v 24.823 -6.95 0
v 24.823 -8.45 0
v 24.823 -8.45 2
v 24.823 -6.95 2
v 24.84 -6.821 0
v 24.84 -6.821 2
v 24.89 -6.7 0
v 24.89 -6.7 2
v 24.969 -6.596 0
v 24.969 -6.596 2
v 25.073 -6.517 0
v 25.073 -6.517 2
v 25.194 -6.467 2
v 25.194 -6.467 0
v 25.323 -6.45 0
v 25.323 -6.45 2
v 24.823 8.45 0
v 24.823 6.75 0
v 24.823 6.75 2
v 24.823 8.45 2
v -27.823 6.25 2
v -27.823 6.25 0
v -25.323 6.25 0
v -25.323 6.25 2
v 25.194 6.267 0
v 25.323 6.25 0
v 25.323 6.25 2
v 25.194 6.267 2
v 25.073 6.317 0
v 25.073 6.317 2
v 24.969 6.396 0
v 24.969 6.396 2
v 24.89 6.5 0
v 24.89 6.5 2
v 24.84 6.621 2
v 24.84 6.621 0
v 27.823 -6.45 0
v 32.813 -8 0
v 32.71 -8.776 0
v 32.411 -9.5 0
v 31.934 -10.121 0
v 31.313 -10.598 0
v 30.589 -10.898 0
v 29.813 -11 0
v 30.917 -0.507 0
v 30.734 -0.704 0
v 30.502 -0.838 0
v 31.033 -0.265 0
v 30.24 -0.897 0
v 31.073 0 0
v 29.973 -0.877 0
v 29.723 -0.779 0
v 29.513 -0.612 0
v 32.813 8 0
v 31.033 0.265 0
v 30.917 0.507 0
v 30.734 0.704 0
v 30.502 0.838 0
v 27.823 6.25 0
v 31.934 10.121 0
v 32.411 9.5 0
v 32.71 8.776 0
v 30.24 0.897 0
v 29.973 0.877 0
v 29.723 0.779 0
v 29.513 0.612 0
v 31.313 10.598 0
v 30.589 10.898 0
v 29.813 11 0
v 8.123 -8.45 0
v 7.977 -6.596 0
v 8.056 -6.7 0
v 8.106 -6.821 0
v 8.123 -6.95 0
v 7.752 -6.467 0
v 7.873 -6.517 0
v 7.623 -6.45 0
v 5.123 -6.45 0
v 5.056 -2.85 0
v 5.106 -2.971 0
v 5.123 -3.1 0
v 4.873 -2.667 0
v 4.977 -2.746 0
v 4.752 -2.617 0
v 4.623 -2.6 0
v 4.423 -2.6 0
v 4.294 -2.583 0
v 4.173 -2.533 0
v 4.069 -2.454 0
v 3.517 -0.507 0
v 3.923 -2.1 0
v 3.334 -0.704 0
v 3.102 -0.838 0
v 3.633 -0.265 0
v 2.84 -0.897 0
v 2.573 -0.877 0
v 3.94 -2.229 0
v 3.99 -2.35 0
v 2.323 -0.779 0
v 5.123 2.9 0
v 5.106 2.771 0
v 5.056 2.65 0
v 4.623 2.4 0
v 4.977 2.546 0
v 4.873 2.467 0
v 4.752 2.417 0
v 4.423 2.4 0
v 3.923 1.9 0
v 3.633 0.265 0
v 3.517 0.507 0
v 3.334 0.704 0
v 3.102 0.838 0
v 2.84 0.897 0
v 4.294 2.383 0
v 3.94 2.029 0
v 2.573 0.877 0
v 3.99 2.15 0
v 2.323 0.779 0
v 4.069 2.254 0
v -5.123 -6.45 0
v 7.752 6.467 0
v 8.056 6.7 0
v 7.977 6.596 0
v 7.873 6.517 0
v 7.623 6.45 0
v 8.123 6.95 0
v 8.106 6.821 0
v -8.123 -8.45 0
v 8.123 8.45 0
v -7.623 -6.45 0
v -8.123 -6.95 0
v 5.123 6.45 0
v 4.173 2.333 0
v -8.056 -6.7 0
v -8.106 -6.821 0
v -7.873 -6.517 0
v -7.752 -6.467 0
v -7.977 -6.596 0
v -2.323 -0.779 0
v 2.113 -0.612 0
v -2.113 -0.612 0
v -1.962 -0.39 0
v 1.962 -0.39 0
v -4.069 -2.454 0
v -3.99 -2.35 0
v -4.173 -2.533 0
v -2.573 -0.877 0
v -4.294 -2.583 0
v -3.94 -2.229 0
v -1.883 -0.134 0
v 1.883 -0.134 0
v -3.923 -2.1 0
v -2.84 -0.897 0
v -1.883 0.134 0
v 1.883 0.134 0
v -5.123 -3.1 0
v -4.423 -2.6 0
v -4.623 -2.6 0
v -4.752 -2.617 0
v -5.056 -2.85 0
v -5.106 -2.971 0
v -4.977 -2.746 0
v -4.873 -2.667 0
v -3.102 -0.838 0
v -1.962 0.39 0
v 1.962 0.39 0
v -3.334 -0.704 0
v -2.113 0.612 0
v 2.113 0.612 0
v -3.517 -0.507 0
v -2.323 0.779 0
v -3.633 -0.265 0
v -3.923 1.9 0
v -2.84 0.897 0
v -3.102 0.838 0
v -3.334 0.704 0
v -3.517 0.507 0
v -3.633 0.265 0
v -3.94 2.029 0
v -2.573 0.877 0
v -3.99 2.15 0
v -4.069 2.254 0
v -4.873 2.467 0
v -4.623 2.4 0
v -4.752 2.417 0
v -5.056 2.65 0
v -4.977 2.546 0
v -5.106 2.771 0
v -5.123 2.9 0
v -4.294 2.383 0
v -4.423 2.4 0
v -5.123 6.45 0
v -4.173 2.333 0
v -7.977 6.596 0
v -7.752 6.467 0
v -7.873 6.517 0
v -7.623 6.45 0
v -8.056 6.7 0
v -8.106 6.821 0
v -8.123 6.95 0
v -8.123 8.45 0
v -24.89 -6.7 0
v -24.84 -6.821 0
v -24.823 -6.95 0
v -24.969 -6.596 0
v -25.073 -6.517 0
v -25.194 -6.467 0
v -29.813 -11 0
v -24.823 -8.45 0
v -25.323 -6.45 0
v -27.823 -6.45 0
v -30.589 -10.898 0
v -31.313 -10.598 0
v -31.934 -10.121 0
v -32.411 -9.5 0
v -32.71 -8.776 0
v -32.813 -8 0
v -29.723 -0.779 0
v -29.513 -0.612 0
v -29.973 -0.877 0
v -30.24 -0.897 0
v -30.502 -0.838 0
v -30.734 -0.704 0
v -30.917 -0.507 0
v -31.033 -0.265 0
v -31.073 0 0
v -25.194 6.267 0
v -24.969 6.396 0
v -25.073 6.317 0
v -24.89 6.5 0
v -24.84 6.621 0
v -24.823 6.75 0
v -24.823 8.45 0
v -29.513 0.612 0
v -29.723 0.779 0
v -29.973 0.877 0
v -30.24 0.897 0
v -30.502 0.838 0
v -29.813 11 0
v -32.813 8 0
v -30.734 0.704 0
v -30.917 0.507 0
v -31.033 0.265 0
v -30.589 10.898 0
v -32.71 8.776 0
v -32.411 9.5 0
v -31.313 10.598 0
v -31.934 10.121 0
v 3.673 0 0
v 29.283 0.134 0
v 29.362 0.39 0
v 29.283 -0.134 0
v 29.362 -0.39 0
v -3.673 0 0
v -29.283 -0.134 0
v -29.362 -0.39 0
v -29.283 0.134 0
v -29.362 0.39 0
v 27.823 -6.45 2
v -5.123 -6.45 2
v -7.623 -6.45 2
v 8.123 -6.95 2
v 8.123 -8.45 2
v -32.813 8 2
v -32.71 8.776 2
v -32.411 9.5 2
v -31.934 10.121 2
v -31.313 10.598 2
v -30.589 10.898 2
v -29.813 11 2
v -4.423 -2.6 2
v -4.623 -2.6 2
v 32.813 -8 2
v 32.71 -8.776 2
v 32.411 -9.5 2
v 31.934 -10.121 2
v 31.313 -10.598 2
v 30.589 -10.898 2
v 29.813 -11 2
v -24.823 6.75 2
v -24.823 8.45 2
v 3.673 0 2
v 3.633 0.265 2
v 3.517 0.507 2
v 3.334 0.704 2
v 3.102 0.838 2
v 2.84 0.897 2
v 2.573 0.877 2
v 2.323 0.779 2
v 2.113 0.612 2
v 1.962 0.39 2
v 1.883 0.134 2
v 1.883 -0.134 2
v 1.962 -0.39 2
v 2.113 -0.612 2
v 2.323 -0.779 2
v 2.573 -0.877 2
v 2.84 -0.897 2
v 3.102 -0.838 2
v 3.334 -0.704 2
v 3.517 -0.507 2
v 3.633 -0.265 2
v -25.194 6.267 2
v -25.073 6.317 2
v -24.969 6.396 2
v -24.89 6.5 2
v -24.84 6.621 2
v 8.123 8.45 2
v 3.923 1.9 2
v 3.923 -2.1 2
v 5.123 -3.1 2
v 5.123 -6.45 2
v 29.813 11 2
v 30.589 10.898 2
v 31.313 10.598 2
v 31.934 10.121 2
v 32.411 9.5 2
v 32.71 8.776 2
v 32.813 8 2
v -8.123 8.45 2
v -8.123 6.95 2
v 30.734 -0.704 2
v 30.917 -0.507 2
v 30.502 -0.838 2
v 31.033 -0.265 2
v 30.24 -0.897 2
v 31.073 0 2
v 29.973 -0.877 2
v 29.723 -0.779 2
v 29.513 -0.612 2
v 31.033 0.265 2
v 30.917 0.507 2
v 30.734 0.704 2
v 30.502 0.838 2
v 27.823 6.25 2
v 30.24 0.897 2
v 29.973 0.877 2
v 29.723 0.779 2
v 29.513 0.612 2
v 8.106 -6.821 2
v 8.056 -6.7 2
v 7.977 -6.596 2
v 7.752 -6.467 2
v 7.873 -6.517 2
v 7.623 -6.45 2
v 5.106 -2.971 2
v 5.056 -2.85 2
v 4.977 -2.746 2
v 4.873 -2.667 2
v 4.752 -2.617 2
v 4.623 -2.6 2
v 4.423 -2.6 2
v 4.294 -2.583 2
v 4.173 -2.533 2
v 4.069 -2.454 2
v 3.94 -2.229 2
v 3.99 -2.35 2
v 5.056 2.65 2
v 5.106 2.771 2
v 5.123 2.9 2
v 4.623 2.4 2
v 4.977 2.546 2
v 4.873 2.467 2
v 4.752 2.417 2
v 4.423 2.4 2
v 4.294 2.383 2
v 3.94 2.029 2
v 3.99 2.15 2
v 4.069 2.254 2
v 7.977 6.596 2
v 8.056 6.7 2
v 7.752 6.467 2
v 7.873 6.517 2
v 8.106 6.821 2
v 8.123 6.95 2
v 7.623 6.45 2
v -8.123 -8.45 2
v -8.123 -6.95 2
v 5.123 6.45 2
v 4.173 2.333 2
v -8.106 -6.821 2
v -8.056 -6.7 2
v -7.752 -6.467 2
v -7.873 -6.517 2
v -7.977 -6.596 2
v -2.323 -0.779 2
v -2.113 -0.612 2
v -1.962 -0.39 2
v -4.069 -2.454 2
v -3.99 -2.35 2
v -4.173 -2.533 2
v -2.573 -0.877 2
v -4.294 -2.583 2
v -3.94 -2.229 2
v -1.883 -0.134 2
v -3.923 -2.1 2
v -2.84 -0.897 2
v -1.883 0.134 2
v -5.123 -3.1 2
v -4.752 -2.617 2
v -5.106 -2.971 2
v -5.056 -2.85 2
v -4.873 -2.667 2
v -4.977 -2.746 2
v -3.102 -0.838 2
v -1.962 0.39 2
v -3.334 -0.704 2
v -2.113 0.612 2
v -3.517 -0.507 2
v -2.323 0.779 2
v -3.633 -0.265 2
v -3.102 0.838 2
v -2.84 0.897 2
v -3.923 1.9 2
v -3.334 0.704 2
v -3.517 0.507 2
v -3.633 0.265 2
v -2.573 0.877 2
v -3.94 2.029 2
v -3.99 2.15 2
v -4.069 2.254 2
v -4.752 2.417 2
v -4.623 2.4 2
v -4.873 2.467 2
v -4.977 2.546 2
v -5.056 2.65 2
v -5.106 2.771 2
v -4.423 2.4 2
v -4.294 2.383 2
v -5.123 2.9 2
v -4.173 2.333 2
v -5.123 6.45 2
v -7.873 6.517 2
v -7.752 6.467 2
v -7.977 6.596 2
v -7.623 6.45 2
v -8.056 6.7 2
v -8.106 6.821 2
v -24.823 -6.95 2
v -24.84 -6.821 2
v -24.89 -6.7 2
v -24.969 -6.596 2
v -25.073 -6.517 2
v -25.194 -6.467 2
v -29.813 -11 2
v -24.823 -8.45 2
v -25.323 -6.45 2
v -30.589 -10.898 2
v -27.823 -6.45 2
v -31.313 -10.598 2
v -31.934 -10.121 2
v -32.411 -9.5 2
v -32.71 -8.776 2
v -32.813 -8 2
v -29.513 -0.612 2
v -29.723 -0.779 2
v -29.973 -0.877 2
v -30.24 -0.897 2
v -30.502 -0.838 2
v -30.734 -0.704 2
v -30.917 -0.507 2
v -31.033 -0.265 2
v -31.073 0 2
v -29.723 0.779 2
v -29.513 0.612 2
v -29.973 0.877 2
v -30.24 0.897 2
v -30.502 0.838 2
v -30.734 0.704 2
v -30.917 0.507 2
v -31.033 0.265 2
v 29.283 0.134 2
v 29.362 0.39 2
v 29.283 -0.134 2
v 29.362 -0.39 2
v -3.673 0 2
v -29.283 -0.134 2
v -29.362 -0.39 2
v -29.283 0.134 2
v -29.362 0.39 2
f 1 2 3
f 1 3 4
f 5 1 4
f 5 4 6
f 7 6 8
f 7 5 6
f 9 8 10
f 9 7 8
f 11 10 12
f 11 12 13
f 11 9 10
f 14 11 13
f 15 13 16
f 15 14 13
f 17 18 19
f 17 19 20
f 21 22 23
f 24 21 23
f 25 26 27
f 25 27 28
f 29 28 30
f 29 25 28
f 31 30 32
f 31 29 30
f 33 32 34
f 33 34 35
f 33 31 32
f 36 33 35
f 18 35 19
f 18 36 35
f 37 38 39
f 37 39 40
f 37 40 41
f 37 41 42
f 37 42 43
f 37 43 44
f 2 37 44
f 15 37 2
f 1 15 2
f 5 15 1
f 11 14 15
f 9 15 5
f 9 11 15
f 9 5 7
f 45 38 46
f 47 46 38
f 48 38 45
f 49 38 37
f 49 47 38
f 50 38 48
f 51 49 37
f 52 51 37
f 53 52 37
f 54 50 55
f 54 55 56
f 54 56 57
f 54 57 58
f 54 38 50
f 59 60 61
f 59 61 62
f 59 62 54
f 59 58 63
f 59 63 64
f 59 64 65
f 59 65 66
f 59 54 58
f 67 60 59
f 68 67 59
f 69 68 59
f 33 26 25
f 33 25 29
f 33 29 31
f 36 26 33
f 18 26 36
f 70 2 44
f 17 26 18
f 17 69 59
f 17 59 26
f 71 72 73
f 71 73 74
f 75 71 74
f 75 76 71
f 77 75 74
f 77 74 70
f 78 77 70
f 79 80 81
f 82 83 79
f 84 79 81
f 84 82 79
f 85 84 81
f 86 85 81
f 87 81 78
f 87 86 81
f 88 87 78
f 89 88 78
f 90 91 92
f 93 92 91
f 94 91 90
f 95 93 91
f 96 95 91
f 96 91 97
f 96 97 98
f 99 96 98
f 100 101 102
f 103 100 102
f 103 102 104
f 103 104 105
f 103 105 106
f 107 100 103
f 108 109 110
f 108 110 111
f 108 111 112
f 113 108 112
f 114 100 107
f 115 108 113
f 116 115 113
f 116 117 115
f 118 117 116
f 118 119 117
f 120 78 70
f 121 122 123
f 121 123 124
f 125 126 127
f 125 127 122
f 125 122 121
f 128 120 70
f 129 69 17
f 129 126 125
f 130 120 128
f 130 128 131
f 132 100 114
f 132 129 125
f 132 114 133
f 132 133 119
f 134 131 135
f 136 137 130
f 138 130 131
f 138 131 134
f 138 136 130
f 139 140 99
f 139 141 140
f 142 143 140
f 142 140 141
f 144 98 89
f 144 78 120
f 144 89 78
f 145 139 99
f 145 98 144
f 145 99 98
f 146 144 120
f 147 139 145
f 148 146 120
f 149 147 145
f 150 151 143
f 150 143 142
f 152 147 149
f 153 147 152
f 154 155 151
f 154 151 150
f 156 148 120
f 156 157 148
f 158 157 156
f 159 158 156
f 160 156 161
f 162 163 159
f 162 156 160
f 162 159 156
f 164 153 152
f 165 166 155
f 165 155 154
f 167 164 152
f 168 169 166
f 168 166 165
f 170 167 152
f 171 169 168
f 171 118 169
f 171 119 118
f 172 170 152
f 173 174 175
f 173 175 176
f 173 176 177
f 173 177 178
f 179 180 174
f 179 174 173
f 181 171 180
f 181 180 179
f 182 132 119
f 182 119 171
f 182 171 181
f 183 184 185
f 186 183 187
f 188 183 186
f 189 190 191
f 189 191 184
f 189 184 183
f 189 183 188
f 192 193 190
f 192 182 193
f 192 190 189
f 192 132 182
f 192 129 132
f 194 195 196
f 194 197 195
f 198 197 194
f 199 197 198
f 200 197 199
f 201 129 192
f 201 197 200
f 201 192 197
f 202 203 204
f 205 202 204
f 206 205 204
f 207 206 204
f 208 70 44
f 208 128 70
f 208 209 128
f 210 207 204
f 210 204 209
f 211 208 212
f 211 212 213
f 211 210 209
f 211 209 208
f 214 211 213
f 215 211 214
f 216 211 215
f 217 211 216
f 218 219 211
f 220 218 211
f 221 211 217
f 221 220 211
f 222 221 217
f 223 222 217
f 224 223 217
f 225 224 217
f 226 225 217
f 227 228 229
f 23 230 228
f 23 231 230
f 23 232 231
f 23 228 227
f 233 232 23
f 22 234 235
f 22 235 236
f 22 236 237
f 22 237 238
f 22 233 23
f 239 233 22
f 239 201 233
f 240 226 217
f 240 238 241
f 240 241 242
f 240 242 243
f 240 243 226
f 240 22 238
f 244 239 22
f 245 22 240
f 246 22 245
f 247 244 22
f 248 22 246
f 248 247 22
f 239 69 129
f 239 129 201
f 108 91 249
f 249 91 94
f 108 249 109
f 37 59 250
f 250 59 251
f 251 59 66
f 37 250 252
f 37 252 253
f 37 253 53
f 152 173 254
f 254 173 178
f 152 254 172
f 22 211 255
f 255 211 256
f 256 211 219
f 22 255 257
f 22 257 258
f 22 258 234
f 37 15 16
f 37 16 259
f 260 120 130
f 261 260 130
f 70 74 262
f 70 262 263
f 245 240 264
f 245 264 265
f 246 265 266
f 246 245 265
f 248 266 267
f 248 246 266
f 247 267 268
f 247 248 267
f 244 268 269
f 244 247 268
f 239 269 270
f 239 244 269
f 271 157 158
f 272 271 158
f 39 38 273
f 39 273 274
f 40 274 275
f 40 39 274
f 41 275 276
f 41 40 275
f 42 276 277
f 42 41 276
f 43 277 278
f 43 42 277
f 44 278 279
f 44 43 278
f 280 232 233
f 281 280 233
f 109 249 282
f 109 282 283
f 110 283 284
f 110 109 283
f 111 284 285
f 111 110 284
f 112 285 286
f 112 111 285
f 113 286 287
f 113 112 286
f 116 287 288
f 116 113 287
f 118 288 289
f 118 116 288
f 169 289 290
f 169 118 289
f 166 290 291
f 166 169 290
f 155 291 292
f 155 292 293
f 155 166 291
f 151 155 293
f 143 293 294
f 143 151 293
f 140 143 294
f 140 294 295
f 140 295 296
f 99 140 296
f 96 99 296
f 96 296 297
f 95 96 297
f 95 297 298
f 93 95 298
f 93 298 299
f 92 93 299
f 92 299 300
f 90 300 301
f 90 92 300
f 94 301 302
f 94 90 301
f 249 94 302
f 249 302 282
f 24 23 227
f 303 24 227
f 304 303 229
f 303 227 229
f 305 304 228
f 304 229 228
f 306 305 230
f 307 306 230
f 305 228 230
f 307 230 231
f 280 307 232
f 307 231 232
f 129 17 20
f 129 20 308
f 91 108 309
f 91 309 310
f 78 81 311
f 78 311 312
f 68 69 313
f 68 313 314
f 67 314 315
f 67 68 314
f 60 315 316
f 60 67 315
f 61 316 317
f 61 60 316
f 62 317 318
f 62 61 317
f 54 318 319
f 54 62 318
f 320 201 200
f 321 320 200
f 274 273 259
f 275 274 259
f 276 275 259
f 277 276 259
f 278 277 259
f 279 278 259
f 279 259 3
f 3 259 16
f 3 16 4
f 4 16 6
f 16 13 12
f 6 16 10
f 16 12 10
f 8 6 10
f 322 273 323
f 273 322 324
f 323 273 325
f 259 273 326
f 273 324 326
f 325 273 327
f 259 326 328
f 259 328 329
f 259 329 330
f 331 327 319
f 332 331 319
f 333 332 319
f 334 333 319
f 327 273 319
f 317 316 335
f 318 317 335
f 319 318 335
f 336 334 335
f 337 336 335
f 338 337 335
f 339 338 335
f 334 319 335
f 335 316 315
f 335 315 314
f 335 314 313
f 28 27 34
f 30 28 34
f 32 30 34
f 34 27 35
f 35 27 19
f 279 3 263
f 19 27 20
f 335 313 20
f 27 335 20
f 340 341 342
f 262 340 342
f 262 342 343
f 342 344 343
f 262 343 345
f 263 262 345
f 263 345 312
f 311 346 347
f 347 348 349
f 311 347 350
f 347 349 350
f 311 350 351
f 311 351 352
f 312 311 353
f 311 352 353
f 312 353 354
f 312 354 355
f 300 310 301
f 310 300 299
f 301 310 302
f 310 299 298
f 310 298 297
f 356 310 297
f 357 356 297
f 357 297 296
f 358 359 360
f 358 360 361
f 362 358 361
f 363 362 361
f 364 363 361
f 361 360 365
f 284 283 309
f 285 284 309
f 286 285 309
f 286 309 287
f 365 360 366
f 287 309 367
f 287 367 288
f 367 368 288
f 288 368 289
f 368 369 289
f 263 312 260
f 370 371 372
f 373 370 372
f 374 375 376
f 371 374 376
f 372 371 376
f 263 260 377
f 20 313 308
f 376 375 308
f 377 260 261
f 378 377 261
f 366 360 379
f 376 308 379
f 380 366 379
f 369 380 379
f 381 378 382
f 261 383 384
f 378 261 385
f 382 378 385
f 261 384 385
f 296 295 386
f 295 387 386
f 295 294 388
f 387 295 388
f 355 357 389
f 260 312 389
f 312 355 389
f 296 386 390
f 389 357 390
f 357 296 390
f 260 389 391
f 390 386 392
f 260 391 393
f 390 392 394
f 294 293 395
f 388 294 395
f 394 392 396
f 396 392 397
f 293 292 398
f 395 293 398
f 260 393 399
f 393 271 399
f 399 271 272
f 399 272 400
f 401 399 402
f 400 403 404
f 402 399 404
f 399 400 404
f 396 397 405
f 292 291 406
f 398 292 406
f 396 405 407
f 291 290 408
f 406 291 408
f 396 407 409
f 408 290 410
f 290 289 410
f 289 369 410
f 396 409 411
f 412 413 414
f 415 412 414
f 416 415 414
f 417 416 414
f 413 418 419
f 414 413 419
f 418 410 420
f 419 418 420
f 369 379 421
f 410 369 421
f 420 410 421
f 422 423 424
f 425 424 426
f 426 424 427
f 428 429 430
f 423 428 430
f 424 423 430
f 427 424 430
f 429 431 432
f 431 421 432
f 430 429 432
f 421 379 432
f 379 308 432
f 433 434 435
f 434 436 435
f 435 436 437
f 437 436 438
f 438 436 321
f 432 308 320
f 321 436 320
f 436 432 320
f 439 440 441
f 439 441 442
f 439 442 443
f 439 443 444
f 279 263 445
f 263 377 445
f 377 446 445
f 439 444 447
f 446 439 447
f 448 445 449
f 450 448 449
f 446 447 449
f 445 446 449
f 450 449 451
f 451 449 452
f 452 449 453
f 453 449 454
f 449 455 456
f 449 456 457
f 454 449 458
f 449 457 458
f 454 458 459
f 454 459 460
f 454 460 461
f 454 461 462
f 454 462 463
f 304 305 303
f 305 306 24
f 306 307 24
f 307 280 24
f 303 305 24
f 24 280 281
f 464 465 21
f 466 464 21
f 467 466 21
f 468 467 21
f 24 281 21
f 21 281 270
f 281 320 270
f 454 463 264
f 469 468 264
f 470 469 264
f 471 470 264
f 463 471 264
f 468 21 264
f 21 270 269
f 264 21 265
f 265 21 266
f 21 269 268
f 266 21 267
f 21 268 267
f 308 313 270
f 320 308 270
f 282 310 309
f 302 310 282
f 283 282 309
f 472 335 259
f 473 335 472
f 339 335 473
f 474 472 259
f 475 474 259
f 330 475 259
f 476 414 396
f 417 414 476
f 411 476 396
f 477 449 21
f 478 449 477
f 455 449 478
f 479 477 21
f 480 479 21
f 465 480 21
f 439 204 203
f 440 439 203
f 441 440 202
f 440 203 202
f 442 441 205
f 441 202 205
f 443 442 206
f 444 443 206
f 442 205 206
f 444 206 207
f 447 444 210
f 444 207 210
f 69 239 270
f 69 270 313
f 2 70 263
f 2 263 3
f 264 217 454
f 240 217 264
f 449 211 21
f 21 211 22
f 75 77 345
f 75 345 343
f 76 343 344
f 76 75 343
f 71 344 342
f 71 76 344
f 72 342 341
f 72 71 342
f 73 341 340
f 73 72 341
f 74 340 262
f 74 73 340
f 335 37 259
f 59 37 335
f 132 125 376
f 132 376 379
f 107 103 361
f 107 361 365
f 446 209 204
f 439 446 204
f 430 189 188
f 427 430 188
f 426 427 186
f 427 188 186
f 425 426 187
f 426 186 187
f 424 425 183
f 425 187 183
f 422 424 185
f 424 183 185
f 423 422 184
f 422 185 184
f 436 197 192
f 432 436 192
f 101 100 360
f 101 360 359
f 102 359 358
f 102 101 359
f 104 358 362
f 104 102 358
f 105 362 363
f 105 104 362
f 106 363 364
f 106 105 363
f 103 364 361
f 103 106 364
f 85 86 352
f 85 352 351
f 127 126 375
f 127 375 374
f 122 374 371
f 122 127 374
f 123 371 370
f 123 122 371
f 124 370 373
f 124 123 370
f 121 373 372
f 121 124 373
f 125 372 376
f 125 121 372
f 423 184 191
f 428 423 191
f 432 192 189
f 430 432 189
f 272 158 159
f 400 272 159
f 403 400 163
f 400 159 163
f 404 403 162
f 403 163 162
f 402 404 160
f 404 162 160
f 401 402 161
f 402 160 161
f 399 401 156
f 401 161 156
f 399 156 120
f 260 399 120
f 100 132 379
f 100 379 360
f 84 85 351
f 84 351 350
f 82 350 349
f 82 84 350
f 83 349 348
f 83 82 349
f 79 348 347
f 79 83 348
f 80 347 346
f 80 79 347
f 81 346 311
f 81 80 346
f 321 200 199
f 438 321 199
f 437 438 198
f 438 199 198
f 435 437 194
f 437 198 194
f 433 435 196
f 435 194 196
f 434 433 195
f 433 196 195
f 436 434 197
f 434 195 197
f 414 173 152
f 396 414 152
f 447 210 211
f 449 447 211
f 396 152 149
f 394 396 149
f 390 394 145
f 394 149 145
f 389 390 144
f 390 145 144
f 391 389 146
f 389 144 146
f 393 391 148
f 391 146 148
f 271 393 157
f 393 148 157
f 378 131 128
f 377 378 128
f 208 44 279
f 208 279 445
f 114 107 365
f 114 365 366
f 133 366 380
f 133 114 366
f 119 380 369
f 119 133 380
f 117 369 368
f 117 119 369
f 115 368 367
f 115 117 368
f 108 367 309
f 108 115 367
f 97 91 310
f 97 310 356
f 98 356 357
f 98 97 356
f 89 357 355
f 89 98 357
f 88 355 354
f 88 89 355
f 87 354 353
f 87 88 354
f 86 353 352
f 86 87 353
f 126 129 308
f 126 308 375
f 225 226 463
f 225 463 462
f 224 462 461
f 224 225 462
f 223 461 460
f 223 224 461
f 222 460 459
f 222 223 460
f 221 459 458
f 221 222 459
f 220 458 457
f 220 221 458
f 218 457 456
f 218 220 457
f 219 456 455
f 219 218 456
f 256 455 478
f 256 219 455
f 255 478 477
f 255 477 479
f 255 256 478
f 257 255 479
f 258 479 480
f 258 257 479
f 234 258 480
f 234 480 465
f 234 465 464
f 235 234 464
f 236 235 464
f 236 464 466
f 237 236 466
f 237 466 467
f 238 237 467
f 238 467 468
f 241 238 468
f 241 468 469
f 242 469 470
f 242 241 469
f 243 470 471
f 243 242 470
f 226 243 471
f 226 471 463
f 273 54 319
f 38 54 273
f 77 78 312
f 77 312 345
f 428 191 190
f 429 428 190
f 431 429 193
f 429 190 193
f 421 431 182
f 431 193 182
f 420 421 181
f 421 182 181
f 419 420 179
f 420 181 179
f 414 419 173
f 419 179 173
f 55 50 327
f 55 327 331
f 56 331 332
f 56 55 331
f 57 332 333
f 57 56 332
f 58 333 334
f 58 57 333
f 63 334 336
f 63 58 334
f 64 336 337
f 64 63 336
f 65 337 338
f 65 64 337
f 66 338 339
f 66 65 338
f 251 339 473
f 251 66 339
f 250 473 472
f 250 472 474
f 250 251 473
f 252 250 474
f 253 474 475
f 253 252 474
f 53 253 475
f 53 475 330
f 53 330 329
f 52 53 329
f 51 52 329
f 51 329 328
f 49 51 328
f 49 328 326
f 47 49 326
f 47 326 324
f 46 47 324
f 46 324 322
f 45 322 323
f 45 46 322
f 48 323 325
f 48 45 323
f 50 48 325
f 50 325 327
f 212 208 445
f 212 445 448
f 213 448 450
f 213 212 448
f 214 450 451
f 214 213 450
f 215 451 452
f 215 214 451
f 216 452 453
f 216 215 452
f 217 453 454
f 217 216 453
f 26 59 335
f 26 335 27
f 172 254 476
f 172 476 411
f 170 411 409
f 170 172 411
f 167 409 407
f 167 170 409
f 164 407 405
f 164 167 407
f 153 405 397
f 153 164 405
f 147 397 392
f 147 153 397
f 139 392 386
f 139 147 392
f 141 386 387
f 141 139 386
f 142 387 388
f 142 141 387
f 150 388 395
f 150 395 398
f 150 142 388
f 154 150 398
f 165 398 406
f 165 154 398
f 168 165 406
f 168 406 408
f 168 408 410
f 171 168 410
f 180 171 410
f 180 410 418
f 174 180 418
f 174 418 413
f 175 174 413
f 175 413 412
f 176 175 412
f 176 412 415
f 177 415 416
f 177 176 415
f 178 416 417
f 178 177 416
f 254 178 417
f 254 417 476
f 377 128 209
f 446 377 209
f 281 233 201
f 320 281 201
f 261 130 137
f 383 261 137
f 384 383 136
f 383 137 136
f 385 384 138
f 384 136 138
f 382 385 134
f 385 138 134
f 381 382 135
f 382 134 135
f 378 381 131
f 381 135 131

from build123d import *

# Parameters (mm, degrees)
SKETCH_1_R      = 0.9
EXTRUDE_1_DEPTH = 2


with BuildPart() as part:
    # 草图1 → 凸台-拉伸1 (new body)
    with BuildSketch(Plane.XY):
        with BuildLine():
            Line((-29.812520549, 11), (29.812520549, 11))
            ThreePointArc((29.812520549, 11), (31.933840892, 10.121320344), (32.812520549, 8))
            Line((32.812520549, 8), (32.812520549, -8))
            ThreePointArc((32.812520549, -8), (31.933840892, -10.121320344), (29.812520549, -11))
            Line((29.812520549, -11), (-29.812520549, -11))
            ThreePointArc((-29.812520549, -11), (-31.933840892, -10.121320344), (-32.812520549, -8))
            Line((-32.812520549, -8), (-32.812520549, 8))
            ThreePointArc((-32.812520549, 8), (-31.933840892, 10.121320344), (-29.812520549, 11))
        make_face()
        with Locations((2.772967143, 0)):
            Circle(SKETCH_1_R, mode=Mode.SUBTRACT)
        with Locations((30.172967143, 0)):
            Circle(SKETCH_1_R, mode=Mode.SUBTRACT)
        with Locations(Location((-30.172967143, 0, 0), (0, 0, 180))):
            Circle(SKETCH_1_R, mode=Mode.SUBTRACT)
        with Locations(Location((-2.772967143, 0, 0), (0, 0, 180))):
            Circle(SKETCH_1_R, mode=Mode.SUBTRACT)
        with BuildLine():
            Line((4.622967163, 2.40000001), (4.422967163, 2.40000001))
            ThreePointArc((4.422967163, 2.40000001), (4.069413775, 2.253553402), (3.922967167, 1.900000014))
            Line((3.922967167, 1.900000014), (3.922967167, -2.099999986))
            ThreePointArc((3.922967167, -2.099999986), (4.069413775, -2.453553374), (4.422967163, -2.599999982))
            Line((4.422967163, -2.599999982), (4.622967163, -2.599999982))
            ThreePointArc((4.622967163, -2.599999982), (4.976520556, -2.746446592), (5.122967167, -3.099999986))
            Line((5.122967167, -3.099999986), (5.122967167, -6.449999996))
            Line((5.122967167, -6.449999996), (7.622967155, -6.449999996))
            ThreePointArc((7.622967155, -6.449999996), (7.976520542, -6.596446604), (8.12296715, -6.949999991))
            Line((8.12296715, -6.949999991), (8.12296715, -8.45))
            Line((8.12296715, -8.45), (24.822967148, -8.45))
            Line((24.822967148, -8.45), (24.822967148, -6.949999996))
            ThreePointArc((24.822967148, -6.949999996), (24.969413756, -6.596446609), (25.322967143, -6.450000001))
            Line((25.322967143, -6.450000001), (27.822967124, -6.450000001))
            Line((27.822967124, -6.450000001), (27.822967124, 6.250000022))
            Line((27.822967124, 6.250000022), (25.322967143, 6.250000022))
            ThreePointArc((25.322967143, 6.250000022), (24.969413756, 6.39644663), (24.822967148, 6.750000017))
            Line((24.822967148, 6.750000017), (24.822967148, 8.45))
            Line((24.822967148, 8.45), (8.122967152, 8.45))
            Line((8.122967152, 8.45), (8.122967152, 6.949999996))
            ThreePointArc((8.122967152, 6.949999996), (7.976520544, 6.596446609), (7.622967157, 6.450000001))
            Line((7.622967157, 6.450000001), (5.122967167, 6.450000001))
            Line((5.122967167, 6.450000001), (5.122967167, 2.900000014))
            ThreePointArc((5.122967167, 2.900000014), (4.976520556, 2.54644662), (4.622967163, 2.40000001))
        make_face(mode=Mode.SUBTRACT)
        with BuildLine():
            Line((-3.922967167, 1.900000014), (-3.922967167, -2.099999986))
            ThreePointArc((-3.922967167, -2.099999986), (-4.069413775, -2.453553374), (-4.422967163, -2.599999982))
            Line((-4.422967163, -2.599999982), (-4.622967163, -2.599999982))
            ThreePointArc((-4.622967163, -2.599999982), (-4.976520556, -2.746446592), (-5.122967167, -3.099999986))
            Line((-5.122967167, -3.099999986), (-5.122967167, -6.449999996))
            Line((-5.122967167, -6.449999996), (-7.622967155, -6.449999996))
            ThreePointArc((-7.622967155, -6.449999996), (-7.976520542, -6.596446604), (-8.12296715, -6.949999991))
            Line((-8.12296715, -6.949999991), (-8.12296715, -8.45))
            Line((-8.12296715, -8.45), (-24.822967148, -8.45))
            Line((-24.822967148, -8.45), (-24.822967148, -6.949999996))
            ThreePointArc((-24.822967148, -6.949999996), (-24.969413756, -6.596446609), (-25.322967143, -6.450000001))
            Line((-25.322967143, -6.450000001), (-27.822967124, -6.450000001))
            Line((-27.822967124, -6.450000001), (-27.822967124, 6.250000022))
            Line((-27.822967124, 6.250000022), (-25.322967143, 6.250000022))
            ThreePointArc((-25.322967143, 6.250000022), (-24.969413756, 6.39644663), (-24.822967148, 6.750000017))
            Line((-24.822967148, 6.750000017), (-24.822967148, 8.45))
            Line((-24.822967148, 8.45), (-8.122967152, 8.45))
            Line((-8.122967152, 8.45), (-8.122967152, 6.949999996))
            ThreePointArc((-8.122967152, 6.949999996), (-7.976520544, 6.596446609), (-7.622967157, 6.450000001))
            Line((-7.622967157, 6.450000001), (-5.122967167, 6.450000001))
            Line((-5.122967167, 6.450000001), (-5.122967167, 2.900000014))
            ThreePointArc((-5.122967167, 2.900000014), (-4.976520556, 2.54644662), (-4.622967163, 2.40000001))
            Line((-4.622967163, 2.40000001), (-4.422967163, 2.40000001))
            ThreePointArc((-4.422967163, 2.40000001), (-4.069413775, 2.253553402), (-3.922967167, 1.900000014))
        make_face(mode=Mode.SUBTRACT)
    extrude(amount=EXTRUDE_1_DEPTH)


solid = part.part
